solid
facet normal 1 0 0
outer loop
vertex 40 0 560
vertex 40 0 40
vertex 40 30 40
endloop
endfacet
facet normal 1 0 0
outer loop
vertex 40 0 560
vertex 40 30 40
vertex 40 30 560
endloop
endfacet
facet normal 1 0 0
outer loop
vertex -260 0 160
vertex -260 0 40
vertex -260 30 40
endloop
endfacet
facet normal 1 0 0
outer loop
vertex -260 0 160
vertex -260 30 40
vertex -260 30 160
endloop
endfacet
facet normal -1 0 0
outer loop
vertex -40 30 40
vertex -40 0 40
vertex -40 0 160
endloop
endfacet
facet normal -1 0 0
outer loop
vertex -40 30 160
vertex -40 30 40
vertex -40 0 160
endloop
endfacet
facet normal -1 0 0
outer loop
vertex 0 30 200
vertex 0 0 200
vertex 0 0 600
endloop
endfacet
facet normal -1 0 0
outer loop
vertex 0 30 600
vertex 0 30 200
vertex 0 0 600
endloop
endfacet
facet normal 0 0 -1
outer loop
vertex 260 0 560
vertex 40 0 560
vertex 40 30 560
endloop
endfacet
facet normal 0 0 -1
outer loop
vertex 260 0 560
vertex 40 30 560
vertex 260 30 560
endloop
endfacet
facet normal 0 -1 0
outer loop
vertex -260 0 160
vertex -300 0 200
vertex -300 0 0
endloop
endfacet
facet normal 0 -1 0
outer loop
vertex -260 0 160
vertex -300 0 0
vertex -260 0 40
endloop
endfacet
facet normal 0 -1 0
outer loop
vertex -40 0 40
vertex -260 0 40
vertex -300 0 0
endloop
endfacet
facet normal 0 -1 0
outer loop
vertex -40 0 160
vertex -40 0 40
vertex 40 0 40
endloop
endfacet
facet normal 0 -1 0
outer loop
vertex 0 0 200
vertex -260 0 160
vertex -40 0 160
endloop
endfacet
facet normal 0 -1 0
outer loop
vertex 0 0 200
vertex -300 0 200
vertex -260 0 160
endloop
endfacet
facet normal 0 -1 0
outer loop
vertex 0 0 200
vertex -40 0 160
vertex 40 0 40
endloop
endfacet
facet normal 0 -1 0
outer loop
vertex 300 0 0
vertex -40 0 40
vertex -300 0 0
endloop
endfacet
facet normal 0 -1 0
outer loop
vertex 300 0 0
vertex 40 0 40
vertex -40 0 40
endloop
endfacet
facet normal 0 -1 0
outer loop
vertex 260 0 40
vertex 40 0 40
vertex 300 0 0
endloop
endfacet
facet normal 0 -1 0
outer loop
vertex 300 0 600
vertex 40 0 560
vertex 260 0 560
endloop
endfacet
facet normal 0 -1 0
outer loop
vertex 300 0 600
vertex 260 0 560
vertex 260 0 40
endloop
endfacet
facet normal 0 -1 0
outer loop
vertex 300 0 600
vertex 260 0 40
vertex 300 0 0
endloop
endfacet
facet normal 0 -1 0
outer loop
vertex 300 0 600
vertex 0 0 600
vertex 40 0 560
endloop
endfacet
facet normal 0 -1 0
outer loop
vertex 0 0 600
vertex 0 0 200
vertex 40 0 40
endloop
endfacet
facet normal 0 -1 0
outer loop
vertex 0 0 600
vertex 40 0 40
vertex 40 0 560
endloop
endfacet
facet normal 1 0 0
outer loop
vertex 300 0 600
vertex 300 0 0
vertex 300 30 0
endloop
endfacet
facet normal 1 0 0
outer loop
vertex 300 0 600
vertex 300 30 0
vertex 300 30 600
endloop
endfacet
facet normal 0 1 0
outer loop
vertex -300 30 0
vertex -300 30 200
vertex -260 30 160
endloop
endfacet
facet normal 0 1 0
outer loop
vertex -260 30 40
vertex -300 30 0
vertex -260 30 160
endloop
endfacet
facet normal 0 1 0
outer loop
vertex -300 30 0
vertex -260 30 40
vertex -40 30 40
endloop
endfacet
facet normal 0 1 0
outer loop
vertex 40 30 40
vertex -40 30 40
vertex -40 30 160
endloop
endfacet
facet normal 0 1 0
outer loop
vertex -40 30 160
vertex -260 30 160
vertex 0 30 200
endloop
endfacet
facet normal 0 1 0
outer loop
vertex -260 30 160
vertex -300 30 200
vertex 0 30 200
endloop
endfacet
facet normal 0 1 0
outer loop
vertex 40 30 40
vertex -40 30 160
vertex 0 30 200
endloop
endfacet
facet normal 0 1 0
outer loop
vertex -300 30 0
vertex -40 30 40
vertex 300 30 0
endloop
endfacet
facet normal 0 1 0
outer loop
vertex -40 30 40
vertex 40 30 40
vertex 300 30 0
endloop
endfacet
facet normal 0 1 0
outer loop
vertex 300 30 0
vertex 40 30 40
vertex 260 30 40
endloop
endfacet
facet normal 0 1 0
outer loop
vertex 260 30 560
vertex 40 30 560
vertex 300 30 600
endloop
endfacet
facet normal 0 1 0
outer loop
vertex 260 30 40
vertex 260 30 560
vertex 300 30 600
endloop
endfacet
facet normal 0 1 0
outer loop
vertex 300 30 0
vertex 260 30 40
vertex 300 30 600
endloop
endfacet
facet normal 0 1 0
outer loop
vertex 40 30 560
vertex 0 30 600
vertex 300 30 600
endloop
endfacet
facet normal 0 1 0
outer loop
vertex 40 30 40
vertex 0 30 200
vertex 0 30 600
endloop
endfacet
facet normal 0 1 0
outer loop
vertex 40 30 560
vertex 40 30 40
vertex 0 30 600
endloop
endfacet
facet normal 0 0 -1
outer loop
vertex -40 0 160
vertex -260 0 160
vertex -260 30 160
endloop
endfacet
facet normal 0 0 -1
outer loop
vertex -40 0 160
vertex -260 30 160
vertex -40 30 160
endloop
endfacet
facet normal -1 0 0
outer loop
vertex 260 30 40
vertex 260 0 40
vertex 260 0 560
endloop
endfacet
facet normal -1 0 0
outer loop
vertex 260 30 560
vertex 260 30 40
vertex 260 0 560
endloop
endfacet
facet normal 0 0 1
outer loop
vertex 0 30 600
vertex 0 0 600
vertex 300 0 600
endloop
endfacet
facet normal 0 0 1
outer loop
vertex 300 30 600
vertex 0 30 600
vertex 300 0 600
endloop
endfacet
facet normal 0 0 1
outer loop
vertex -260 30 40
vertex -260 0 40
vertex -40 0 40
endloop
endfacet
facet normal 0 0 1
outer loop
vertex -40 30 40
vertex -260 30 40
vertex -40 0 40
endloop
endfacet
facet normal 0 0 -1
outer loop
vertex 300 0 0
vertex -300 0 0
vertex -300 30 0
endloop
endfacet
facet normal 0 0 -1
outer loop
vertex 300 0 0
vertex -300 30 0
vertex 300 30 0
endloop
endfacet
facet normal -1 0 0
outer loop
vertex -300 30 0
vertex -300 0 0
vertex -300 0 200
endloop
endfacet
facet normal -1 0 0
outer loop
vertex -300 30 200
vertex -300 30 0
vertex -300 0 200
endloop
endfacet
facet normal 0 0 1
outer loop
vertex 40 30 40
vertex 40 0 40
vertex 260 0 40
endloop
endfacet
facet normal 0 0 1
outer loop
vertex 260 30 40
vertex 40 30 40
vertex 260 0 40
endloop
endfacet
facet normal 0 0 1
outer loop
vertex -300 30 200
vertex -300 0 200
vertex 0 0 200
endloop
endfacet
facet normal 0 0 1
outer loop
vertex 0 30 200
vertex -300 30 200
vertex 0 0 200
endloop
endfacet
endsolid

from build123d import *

# Parameters (mm, degrees)
F0_W     = 300
F0_H     = 600
F1_DEPTH = 30
F2_W     = 220
F2_H     = 520
F3_DEPTH = 35
F4_W     = 300
F4_H     = 200
F5_DEPTH = 30
F6_W     = 220
F6_H     = 120
F7_DEPTH = 40


with BuildPart() as f1:
    # F0 (on Front) → F1 (new body)
    with BuildSketch(Plane.XZ):
        with Locations((150, 300)):
            Rectangle(F0_W, F0_H)
    extrude(amount=-F1_DEPTH)

    # F2 (on face) → F3 (cut)
    with BuildSketch(Plane.XZ):
        with Locations((150, 300)):
            Rectangle(F2_W, F2_H)
    extrude(amount=-F3_DEPTH, mode=Mode.SUBTRACT)

    # F4 (on Front) → F5 (join)
    with BuildSketch(Plane.XZ):
        with Locations((-150, 100)):
            Rectangle(F4_W, F4_H)
    extrude(amount=-F5_DEPTH)

    # F6 (on face) → F7 (cut)
    with BuildSketch(Plane.XZ):
        with Locations((-150, 100)):
            Rectangle(F6_W, F6_H)
    extrude(amount=-F7_DEPTH, mode=Mode.SUBTRACT)


solid = f1.part
